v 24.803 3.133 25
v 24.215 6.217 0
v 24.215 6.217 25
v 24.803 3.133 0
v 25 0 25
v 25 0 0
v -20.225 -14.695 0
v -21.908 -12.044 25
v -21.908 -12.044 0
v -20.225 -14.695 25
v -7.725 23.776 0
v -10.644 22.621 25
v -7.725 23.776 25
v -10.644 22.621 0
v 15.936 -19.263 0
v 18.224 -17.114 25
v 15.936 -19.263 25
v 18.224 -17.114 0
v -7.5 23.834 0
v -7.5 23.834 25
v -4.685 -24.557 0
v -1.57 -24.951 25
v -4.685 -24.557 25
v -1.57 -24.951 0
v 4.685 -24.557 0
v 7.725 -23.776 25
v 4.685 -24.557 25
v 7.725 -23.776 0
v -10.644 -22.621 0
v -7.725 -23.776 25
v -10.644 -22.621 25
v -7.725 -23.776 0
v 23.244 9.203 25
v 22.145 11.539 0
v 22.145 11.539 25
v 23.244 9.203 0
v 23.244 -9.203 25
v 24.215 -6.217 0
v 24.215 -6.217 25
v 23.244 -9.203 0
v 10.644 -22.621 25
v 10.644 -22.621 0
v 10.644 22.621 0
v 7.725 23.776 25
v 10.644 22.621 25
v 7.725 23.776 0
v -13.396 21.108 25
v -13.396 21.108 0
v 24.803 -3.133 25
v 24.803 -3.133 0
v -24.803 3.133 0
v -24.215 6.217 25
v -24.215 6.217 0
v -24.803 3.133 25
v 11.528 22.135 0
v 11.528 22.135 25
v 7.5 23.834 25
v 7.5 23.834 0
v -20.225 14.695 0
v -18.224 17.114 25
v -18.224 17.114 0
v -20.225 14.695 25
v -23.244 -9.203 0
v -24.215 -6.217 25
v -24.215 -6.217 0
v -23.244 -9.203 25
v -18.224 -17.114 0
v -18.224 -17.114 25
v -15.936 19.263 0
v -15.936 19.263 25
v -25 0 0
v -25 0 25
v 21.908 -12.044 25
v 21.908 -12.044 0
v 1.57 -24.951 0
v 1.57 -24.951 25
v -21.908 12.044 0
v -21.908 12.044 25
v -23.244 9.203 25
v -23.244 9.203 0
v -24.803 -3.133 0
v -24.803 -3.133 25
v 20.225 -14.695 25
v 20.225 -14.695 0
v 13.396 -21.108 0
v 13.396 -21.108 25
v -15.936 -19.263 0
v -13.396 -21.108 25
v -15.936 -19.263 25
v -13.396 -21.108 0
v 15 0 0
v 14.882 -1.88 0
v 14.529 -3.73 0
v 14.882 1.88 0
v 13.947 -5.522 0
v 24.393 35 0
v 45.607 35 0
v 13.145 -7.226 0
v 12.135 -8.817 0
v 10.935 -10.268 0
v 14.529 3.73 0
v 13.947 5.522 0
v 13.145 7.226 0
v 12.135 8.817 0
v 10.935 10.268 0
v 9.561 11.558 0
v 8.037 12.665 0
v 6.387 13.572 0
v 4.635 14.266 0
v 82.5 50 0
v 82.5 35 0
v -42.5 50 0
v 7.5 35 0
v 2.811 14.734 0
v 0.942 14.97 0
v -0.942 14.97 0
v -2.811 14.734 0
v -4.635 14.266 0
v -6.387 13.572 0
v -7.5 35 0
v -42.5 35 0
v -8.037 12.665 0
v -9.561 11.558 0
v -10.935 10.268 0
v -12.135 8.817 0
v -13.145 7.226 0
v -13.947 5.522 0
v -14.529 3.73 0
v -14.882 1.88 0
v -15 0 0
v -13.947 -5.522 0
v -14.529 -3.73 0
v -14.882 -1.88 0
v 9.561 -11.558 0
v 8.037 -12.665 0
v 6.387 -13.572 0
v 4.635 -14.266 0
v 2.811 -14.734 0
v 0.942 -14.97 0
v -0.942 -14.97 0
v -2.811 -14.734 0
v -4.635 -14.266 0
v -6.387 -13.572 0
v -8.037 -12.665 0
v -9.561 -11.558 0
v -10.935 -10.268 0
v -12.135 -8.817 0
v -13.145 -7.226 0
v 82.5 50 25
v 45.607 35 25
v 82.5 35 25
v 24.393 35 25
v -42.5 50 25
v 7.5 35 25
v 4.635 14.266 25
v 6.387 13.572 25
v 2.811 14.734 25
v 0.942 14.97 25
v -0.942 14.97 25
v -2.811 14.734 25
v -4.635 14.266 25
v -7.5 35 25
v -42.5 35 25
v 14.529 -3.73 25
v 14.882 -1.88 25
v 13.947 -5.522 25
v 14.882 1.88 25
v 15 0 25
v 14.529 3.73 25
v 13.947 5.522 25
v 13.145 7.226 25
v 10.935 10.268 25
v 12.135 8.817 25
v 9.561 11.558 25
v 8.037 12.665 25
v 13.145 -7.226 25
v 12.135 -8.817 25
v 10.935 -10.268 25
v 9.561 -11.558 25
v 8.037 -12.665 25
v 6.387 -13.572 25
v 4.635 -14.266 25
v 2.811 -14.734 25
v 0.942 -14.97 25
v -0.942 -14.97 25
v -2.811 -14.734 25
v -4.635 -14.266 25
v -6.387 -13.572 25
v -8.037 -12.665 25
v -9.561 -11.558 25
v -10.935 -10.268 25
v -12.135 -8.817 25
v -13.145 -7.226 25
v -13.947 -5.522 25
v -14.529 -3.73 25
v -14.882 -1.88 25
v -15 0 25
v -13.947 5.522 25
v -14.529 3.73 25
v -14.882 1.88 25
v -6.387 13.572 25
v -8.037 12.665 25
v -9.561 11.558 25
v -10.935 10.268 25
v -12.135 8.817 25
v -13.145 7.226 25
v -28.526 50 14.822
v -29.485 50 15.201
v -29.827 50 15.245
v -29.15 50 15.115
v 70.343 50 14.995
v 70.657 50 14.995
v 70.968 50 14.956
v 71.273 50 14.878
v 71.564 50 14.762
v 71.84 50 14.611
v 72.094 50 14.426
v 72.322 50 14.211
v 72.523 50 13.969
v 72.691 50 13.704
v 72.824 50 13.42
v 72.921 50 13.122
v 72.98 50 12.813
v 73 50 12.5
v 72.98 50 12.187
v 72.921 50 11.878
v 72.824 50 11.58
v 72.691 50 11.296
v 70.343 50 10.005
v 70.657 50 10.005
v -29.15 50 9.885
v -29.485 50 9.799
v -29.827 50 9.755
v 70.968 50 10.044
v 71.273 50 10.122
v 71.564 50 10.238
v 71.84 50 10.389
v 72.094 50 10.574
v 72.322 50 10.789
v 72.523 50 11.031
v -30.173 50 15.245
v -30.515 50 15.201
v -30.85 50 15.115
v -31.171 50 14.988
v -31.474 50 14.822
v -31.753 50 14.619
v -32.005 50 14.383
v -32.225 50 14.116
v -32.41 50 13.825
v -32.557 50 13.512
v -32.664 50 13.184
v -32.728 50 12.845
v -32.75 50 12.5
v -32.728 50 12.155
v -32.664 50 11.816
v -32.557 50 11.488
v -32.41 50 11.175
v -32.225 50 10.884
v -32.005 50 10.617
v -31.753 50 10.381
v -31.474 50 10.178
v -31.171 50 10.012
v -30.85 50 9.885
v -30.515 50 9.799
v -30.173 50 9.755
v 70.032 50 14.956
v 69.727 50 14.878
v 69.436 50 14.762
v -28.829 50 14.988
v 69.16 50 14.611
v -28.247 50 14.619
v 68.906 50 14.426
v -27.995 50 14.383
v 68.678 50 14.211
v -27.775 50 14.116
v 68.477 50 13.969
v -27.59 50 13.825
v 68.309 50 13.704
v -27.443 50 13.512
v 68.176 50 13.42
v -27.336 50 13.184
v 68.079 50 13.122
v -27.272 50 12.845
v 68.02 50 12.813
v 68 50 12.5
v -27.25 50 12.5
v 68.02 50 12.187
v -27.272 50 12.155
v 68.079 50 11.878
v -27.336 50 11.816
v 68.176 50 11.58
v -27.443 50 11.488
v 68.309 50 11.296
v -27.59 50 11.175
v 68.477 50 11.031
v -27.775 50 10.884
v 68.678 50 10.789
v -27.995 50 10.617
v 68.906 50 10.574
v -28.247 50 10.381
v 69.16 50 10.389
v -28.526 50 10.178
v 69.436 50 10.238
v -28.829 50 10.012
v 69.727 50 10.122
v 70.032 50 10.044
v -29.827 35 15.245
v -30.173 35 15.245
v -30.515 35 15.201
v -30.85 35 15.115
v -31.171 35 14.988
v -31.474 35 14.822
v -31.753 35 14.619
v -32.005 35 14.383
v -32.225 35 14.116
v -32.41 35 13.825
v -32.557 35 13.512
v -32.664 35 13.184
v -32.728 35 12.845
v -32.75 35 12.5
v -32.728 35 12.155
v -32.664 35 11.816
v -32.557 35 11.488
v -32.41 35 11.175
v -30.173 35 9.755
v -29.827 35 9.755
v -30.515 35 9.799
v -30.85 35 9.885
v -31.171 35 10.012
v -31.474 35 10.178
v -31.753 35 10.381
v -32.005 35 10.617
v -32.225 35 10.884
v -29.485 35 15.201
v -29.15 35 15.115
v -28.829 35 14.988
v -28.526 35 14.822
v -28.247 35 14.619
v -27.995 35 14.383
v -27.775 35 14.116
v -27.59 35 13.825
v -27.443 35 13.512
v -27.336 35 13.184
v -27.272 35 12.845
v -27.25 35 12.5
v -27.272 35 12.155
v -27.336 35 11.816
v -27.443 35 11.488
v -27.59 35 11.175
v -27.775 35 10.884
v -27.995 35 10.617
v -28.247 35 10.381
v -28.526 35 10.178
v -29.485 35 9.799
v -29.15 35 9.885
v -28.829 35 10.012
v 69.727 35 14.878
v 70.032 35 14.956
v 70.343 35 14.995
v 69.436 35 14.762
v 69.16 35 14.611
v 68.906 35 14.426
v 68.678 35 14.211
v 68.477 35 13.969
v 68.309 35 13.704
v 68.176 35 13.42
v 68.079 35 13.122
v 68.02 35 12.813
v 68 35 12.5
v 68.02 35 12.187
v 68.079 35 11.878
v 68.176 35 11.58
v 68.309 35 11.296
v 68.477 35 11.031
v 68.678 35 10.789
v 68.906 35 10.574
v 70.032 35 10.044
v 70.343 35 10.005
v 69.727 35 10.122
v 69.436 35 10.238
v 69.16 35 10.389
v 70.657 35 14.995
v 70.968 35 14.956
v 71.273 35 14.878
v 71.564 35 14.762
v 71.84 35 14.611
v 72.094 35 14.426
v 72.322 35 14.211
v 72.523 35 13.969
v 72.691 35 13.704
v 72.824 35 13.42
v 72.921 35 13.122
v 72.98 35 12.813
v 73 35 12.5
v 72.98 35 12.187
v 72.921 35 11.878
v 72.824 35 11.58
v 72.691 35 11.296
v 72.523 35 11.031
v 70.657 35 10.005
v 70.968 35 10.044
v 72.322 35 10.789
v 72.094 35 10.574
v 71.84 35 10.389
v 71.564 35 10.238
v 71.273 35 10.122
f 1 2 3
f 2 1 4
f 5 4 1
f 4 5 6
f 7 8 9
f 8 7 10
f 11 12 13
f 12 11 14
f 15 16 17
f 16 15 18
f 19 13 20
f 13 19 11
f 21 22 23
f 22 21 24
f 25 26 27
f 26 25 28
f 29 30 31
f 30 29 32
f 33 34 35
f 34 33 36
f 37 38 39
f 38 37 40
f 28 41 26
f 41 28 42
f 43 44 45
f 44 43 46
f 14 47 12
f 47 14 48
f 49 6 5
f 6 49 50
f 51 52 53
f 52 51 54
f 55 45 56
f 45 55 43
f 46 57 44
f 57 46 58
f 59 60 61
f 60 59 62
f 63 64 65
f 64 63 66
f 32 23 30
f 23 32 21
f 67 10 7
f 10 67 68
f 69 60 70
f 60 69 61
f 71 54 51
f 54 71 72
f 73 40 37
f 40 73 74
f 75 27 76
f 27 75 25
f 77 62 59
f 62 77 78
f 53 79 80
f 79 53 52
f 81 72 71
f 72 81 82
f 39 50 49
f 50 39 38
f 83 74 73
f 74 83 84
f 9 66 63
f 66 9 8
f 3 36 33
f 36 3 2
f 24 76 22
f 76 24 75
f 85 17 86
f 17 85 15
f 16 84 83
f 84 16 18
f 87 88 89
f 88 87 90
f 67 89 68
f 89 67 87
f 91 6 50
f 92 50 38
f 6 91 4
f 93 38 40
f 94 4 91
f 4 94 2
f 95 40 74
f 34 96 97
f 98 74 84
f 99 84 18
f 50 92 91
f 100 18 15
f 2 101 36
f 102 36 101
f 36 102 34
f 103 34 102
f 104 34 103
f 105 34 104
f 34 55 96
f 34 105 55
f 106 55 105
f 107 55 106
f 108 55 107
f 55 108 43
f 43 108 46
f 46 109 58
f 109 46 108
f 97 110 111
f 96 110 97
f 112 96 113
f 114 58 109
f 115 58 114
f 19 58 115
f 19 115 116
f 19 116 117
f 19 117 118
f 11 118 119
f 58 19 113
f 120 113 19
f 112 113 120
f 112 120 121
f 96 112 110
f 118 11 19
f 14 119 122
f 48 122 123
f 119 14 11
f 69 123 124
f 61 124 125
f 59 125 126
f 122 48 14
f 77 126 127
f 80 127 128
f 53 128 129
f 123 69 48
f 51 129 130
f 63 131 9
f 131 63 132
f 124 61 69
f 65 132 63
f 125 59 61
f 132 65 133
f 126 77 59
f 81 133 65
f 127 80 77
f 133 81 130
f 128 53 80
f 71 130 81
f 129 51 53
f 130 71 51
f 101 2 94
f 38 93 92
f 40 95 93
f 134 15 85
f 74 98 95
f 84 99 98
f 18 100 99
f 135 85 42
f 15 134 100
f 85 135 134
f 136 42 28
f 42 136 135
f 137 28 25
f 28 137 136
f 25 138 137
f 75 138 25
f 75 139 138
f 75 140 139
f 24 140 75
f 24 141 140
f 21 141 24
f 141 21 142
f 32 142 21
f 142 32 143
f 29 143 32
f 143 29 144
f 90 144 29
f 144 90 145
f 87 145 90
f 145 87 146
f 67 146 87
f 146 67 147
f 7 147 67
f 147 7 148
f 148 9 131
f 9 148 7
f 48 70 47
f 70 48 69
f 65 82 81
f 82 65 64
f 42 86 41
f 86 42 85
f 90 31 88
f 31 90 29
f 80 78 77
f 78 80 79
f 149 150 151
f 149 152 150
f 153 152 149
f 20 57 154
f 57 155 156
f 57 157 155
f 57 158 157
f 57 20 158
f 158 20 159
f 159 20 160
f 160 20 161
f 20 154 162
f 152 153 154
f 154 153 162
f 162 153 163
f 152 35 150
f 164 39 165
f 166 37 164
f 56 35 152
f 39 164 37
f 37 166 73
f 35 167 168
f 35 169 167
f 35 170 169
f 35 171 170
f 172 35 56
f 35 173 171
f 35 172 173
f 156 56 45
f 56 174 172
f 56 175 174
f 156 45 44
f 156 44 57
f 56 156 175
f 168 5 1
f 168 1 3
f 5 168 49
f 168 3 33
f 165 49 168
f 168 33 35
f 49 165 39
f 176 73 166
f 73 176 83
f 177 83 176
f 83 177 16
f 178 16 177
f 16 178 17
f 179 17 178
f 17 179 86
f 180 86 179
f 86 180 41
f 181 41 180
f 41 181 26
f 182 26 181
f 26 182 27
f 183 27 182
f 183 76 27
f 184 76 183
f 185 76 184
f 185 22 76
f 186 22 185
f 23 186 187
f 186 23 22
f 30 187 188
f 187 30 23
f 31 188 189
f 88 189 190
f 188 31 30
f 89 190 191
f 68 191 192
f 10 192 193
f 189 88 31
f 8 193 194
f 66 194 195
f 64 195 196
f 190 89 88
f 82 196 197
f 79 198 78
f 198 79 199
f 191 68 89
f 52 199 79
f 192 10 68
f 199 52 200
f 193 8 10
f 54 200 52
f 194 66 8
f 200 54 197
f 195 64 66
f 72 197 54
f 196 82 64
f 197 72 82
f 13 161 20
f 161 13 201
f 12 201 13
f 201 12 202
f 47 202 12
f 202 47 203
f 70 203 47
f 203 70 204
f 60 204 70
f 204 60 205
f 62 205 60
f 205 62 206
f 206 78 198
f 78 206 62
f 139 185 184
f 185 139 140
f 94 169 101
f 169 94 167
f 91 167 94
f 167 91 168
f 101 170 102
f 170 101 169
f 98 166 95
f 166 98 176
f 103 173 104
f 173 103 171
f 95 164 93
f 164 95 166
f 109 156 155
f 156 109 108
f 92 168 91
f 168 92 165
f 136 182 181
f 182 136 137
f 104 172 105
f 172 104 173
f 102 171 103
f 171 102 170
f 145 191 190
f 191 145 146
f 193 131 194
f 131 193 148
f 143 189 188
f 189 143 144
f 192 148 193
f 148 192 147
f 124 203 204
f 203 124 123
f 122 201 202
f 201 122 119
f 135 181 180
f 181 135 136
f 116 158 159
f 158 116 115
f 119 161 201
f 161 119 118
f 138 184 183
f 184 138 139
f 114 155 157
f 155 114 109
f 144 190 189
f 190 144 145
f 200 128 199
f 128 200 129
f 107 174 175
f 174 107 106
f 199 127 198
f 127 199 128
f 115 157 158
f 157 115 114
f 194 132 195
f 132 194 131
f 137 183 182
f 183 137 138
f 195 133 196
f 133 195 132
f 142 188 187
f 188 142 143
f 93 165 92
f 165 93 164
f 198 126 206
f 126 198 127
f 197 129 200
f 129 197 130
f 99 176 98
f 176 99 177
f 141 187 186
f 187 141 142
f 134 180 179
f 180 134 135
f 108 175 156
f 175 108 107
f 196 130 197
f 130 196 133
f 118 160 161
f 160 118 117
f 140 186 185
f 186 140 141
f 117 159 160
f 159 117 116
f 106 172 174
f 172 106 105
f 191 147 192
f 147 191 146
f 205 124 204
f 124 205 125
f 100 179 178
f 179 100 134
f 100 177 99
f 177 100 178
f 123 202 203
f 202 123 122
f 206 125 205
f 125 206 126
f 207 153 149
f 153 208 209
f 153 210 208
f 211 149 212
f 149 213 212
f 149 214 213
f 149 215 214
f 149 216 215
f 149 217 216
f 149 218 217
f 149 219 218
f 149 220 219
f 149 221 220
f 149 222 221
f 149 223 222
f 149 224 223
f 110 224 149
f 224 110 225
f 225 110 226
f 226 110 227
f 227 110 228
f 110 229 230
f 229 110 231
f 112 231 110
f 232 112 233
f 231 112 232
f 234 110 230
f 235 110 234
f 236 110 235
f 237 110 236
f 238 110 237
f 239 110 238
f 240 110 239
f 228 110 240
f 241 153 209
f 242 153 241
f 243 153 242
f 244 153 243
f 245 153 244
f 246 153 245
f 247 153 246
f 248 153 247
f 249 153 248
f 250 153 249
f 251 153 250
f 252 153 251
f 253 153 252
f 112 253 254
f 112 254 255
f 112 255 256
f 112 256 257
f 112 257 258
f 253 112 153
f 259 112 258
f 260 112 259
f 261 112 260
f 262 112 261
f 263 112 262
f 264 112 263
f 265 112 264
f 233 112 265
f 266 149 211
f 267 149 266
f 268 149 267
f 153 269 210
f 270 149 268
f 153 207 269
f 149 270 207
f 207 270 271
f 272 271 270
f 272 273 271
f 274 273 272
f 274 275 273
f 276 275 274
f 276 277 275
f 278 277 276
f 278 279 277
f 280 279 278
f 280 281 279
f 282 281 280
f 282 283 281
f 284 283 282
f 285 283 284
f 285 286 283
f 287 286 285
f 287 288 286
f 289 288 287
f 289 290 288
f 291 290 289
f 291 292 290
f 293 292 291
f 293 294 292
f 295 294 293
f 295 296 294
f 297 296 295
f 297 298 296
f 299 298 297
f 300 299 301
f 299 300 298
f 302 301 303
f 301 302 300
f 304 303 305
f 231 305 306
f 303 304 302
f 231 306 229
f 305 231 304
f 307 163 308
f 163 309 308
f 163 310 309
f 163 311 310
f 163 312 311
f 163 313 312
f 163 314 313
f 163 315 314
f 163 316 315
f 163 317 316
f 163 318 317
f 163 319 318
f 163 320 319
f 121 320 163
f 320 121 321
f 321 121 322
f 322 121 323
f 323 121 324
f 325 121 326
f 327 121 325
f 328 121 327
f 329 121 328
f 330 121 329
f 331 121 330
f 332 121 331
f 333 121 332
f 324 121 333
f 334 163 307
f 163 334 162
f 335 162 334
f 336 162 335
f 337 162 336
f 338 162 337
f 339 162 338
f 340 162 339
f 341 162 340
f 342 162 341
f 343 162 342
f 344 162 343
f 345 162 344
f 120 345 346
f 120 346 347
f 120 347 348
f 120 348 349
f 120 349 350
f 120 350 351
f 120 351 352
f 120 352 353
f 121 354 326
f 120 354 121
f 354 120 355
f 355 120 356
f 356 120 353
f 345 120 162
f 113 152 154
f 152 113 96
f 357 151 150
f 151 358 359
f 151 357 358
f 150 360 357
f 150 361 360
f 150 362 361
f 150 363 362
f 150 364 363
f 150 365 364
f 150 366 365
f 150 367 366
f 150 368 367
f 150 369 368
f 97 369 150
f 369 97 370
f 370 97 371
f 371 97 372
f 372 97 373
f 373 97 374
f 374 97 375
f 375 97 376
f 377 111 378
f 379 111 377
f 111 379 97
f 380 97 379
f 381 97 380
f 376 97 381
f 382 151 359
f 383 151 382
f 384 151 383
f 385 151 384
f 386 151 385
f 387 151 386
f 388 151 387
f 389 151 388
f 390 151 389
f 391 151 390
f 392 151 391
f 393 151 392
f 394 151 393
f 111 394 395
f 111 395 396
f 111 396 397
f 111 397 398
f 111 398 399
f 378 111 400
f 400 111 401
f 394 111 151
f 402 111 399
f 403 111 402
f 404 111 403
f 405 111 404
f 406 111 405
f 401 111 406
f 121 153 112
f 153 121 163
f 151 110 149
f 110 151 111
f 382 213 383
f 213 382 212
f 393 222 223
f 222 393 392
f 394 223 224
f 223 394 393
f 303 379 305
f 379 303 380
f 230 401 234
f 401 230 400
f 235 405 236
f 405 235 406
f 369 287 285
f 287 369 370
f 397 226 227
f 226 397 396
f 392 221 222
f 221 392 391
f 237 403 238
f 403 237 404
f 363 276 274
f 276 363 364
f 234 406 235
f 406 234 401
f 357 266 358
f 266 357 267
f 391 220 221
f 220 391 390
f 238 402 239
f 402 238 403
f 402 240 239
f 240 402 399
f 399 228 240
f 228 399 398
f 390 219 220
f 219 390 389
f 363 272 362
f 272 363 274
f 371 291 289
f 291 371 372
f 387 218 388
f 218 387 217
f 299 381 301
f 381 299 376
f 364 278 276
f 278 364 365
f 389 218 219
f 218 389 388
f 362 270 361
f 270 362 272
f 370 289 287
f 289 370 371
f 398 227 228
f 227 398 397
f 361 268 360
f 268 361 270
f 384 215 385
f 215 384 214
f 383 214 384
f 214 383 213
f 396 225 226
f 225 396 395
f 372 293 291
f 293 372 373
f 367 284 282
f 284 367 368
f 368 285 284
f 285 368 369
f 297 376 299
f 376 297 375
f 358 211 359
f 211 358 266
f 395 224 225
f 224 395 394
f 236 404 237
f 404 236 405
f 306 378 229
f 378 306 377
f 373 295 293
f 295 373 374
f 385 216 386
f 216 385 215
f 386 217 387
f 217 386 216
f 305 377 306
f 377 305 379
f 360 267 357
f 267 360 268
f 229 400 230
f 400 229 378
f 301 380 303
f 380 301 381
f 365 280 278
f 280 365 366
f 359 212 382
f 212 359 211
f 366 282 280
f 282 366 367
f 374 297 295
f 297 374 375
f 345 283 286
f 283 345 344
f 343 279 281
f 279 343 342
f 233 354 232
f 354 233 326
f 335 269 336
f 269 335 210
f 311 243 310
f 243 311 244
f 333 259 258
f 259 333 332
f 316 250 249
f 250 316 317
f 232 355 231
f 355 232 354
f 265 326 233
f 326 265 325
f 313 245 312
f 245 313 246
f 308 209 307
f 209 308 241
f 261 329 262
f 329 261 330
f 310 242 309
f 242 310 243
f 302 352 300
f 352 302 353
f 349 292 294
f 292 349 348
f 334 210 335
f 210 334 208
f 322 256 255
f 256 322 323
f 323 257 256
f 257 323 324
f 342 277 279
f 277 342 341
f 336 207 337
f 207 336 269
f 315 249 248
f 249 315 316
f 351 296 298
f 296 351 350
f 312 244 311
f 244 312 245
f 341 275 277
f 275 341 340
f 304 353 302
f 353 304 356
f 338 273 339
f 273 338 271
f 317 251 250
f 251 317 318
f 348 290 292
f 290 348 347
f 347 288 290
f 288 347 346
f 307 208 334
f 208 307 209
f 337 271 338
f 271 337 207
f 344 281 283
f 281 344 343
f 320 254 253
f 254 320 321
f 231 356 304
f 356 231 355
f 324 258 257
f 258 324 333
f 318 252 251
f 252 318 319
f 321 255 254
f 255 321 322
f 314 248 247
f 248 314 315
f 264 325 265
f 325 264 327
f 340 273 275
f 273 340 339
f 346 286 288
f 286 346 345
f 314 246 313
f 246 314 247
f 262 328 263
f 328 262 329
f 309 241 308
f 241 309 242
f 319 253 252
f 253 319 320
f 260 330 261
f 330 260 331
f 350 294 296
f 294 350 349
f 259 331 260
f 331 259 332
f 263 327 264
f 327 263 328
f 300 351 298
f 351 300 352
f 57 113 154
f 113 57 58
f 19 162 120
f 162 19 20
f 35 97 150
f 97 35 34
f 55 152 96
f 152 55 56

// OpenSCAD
$fn=50;

rodRadius = 15; // include padding
hangerWidth = 25;  // width of the hanger
hangerArmThickness = 15; // thickness of the arm
hangerArmLength = 20; // distance from wall
wallMountExtension = 90; // extension above and below the main arms for screw holes

// rod hole
difference(){
	cylinder (hangerWidth,rodRadius+10, rodRadius+10, false);
	cylinder (hangerWidth*3,rodRadius, rodRadius, true);
}

// straight mount
translate([-hangerArmThickness/2,rodRadius,0])
	cube([hangerArmThickness, hangerArmLength, hangerWidth], false);
	
// support	
rotate([0,0,-45])
	translate([-hangerArmThickness/2,rodRadius,0])
		cube([hangerArmThickness, sqrt(pow(hangerArmLength,2) + pow(hangerArmLength,2)) + hangerArmThickness, hangerWidth], false);	
		
		
// wall mount
difference(){
translate([(hangerArmLength + hangerArmThickness + (wallMountExtension / 2) + 10) - (hangerArmThickness/2),hangerArmLength + rodRadius,0])
rotate([0,0,90])
cube([hangerArmThickness, hangerArmLength + hangerArmThickness + wallMountExtension, hangerWidth], false);

// screw holes
translate([(hangerArmLength + hangerArmThickness + (wallMountExtension / 2) + 10) - (hangerArmThickness/2) - 12,hangerArmLength + hangerArmThickness + 5,hangerWidth/2])
rotate([90,0,0])
cylinder (hangerArmThickness * 2,2.5, 2.5, true);

translate([-hangerArmThickness - 15,hangerArmLength + hangerArmThickness + 5,hangerWidth/2])
rotate([90,0,0])
cylinder (hangerArmThickness * 2,2.75, 2.75, true);
}
